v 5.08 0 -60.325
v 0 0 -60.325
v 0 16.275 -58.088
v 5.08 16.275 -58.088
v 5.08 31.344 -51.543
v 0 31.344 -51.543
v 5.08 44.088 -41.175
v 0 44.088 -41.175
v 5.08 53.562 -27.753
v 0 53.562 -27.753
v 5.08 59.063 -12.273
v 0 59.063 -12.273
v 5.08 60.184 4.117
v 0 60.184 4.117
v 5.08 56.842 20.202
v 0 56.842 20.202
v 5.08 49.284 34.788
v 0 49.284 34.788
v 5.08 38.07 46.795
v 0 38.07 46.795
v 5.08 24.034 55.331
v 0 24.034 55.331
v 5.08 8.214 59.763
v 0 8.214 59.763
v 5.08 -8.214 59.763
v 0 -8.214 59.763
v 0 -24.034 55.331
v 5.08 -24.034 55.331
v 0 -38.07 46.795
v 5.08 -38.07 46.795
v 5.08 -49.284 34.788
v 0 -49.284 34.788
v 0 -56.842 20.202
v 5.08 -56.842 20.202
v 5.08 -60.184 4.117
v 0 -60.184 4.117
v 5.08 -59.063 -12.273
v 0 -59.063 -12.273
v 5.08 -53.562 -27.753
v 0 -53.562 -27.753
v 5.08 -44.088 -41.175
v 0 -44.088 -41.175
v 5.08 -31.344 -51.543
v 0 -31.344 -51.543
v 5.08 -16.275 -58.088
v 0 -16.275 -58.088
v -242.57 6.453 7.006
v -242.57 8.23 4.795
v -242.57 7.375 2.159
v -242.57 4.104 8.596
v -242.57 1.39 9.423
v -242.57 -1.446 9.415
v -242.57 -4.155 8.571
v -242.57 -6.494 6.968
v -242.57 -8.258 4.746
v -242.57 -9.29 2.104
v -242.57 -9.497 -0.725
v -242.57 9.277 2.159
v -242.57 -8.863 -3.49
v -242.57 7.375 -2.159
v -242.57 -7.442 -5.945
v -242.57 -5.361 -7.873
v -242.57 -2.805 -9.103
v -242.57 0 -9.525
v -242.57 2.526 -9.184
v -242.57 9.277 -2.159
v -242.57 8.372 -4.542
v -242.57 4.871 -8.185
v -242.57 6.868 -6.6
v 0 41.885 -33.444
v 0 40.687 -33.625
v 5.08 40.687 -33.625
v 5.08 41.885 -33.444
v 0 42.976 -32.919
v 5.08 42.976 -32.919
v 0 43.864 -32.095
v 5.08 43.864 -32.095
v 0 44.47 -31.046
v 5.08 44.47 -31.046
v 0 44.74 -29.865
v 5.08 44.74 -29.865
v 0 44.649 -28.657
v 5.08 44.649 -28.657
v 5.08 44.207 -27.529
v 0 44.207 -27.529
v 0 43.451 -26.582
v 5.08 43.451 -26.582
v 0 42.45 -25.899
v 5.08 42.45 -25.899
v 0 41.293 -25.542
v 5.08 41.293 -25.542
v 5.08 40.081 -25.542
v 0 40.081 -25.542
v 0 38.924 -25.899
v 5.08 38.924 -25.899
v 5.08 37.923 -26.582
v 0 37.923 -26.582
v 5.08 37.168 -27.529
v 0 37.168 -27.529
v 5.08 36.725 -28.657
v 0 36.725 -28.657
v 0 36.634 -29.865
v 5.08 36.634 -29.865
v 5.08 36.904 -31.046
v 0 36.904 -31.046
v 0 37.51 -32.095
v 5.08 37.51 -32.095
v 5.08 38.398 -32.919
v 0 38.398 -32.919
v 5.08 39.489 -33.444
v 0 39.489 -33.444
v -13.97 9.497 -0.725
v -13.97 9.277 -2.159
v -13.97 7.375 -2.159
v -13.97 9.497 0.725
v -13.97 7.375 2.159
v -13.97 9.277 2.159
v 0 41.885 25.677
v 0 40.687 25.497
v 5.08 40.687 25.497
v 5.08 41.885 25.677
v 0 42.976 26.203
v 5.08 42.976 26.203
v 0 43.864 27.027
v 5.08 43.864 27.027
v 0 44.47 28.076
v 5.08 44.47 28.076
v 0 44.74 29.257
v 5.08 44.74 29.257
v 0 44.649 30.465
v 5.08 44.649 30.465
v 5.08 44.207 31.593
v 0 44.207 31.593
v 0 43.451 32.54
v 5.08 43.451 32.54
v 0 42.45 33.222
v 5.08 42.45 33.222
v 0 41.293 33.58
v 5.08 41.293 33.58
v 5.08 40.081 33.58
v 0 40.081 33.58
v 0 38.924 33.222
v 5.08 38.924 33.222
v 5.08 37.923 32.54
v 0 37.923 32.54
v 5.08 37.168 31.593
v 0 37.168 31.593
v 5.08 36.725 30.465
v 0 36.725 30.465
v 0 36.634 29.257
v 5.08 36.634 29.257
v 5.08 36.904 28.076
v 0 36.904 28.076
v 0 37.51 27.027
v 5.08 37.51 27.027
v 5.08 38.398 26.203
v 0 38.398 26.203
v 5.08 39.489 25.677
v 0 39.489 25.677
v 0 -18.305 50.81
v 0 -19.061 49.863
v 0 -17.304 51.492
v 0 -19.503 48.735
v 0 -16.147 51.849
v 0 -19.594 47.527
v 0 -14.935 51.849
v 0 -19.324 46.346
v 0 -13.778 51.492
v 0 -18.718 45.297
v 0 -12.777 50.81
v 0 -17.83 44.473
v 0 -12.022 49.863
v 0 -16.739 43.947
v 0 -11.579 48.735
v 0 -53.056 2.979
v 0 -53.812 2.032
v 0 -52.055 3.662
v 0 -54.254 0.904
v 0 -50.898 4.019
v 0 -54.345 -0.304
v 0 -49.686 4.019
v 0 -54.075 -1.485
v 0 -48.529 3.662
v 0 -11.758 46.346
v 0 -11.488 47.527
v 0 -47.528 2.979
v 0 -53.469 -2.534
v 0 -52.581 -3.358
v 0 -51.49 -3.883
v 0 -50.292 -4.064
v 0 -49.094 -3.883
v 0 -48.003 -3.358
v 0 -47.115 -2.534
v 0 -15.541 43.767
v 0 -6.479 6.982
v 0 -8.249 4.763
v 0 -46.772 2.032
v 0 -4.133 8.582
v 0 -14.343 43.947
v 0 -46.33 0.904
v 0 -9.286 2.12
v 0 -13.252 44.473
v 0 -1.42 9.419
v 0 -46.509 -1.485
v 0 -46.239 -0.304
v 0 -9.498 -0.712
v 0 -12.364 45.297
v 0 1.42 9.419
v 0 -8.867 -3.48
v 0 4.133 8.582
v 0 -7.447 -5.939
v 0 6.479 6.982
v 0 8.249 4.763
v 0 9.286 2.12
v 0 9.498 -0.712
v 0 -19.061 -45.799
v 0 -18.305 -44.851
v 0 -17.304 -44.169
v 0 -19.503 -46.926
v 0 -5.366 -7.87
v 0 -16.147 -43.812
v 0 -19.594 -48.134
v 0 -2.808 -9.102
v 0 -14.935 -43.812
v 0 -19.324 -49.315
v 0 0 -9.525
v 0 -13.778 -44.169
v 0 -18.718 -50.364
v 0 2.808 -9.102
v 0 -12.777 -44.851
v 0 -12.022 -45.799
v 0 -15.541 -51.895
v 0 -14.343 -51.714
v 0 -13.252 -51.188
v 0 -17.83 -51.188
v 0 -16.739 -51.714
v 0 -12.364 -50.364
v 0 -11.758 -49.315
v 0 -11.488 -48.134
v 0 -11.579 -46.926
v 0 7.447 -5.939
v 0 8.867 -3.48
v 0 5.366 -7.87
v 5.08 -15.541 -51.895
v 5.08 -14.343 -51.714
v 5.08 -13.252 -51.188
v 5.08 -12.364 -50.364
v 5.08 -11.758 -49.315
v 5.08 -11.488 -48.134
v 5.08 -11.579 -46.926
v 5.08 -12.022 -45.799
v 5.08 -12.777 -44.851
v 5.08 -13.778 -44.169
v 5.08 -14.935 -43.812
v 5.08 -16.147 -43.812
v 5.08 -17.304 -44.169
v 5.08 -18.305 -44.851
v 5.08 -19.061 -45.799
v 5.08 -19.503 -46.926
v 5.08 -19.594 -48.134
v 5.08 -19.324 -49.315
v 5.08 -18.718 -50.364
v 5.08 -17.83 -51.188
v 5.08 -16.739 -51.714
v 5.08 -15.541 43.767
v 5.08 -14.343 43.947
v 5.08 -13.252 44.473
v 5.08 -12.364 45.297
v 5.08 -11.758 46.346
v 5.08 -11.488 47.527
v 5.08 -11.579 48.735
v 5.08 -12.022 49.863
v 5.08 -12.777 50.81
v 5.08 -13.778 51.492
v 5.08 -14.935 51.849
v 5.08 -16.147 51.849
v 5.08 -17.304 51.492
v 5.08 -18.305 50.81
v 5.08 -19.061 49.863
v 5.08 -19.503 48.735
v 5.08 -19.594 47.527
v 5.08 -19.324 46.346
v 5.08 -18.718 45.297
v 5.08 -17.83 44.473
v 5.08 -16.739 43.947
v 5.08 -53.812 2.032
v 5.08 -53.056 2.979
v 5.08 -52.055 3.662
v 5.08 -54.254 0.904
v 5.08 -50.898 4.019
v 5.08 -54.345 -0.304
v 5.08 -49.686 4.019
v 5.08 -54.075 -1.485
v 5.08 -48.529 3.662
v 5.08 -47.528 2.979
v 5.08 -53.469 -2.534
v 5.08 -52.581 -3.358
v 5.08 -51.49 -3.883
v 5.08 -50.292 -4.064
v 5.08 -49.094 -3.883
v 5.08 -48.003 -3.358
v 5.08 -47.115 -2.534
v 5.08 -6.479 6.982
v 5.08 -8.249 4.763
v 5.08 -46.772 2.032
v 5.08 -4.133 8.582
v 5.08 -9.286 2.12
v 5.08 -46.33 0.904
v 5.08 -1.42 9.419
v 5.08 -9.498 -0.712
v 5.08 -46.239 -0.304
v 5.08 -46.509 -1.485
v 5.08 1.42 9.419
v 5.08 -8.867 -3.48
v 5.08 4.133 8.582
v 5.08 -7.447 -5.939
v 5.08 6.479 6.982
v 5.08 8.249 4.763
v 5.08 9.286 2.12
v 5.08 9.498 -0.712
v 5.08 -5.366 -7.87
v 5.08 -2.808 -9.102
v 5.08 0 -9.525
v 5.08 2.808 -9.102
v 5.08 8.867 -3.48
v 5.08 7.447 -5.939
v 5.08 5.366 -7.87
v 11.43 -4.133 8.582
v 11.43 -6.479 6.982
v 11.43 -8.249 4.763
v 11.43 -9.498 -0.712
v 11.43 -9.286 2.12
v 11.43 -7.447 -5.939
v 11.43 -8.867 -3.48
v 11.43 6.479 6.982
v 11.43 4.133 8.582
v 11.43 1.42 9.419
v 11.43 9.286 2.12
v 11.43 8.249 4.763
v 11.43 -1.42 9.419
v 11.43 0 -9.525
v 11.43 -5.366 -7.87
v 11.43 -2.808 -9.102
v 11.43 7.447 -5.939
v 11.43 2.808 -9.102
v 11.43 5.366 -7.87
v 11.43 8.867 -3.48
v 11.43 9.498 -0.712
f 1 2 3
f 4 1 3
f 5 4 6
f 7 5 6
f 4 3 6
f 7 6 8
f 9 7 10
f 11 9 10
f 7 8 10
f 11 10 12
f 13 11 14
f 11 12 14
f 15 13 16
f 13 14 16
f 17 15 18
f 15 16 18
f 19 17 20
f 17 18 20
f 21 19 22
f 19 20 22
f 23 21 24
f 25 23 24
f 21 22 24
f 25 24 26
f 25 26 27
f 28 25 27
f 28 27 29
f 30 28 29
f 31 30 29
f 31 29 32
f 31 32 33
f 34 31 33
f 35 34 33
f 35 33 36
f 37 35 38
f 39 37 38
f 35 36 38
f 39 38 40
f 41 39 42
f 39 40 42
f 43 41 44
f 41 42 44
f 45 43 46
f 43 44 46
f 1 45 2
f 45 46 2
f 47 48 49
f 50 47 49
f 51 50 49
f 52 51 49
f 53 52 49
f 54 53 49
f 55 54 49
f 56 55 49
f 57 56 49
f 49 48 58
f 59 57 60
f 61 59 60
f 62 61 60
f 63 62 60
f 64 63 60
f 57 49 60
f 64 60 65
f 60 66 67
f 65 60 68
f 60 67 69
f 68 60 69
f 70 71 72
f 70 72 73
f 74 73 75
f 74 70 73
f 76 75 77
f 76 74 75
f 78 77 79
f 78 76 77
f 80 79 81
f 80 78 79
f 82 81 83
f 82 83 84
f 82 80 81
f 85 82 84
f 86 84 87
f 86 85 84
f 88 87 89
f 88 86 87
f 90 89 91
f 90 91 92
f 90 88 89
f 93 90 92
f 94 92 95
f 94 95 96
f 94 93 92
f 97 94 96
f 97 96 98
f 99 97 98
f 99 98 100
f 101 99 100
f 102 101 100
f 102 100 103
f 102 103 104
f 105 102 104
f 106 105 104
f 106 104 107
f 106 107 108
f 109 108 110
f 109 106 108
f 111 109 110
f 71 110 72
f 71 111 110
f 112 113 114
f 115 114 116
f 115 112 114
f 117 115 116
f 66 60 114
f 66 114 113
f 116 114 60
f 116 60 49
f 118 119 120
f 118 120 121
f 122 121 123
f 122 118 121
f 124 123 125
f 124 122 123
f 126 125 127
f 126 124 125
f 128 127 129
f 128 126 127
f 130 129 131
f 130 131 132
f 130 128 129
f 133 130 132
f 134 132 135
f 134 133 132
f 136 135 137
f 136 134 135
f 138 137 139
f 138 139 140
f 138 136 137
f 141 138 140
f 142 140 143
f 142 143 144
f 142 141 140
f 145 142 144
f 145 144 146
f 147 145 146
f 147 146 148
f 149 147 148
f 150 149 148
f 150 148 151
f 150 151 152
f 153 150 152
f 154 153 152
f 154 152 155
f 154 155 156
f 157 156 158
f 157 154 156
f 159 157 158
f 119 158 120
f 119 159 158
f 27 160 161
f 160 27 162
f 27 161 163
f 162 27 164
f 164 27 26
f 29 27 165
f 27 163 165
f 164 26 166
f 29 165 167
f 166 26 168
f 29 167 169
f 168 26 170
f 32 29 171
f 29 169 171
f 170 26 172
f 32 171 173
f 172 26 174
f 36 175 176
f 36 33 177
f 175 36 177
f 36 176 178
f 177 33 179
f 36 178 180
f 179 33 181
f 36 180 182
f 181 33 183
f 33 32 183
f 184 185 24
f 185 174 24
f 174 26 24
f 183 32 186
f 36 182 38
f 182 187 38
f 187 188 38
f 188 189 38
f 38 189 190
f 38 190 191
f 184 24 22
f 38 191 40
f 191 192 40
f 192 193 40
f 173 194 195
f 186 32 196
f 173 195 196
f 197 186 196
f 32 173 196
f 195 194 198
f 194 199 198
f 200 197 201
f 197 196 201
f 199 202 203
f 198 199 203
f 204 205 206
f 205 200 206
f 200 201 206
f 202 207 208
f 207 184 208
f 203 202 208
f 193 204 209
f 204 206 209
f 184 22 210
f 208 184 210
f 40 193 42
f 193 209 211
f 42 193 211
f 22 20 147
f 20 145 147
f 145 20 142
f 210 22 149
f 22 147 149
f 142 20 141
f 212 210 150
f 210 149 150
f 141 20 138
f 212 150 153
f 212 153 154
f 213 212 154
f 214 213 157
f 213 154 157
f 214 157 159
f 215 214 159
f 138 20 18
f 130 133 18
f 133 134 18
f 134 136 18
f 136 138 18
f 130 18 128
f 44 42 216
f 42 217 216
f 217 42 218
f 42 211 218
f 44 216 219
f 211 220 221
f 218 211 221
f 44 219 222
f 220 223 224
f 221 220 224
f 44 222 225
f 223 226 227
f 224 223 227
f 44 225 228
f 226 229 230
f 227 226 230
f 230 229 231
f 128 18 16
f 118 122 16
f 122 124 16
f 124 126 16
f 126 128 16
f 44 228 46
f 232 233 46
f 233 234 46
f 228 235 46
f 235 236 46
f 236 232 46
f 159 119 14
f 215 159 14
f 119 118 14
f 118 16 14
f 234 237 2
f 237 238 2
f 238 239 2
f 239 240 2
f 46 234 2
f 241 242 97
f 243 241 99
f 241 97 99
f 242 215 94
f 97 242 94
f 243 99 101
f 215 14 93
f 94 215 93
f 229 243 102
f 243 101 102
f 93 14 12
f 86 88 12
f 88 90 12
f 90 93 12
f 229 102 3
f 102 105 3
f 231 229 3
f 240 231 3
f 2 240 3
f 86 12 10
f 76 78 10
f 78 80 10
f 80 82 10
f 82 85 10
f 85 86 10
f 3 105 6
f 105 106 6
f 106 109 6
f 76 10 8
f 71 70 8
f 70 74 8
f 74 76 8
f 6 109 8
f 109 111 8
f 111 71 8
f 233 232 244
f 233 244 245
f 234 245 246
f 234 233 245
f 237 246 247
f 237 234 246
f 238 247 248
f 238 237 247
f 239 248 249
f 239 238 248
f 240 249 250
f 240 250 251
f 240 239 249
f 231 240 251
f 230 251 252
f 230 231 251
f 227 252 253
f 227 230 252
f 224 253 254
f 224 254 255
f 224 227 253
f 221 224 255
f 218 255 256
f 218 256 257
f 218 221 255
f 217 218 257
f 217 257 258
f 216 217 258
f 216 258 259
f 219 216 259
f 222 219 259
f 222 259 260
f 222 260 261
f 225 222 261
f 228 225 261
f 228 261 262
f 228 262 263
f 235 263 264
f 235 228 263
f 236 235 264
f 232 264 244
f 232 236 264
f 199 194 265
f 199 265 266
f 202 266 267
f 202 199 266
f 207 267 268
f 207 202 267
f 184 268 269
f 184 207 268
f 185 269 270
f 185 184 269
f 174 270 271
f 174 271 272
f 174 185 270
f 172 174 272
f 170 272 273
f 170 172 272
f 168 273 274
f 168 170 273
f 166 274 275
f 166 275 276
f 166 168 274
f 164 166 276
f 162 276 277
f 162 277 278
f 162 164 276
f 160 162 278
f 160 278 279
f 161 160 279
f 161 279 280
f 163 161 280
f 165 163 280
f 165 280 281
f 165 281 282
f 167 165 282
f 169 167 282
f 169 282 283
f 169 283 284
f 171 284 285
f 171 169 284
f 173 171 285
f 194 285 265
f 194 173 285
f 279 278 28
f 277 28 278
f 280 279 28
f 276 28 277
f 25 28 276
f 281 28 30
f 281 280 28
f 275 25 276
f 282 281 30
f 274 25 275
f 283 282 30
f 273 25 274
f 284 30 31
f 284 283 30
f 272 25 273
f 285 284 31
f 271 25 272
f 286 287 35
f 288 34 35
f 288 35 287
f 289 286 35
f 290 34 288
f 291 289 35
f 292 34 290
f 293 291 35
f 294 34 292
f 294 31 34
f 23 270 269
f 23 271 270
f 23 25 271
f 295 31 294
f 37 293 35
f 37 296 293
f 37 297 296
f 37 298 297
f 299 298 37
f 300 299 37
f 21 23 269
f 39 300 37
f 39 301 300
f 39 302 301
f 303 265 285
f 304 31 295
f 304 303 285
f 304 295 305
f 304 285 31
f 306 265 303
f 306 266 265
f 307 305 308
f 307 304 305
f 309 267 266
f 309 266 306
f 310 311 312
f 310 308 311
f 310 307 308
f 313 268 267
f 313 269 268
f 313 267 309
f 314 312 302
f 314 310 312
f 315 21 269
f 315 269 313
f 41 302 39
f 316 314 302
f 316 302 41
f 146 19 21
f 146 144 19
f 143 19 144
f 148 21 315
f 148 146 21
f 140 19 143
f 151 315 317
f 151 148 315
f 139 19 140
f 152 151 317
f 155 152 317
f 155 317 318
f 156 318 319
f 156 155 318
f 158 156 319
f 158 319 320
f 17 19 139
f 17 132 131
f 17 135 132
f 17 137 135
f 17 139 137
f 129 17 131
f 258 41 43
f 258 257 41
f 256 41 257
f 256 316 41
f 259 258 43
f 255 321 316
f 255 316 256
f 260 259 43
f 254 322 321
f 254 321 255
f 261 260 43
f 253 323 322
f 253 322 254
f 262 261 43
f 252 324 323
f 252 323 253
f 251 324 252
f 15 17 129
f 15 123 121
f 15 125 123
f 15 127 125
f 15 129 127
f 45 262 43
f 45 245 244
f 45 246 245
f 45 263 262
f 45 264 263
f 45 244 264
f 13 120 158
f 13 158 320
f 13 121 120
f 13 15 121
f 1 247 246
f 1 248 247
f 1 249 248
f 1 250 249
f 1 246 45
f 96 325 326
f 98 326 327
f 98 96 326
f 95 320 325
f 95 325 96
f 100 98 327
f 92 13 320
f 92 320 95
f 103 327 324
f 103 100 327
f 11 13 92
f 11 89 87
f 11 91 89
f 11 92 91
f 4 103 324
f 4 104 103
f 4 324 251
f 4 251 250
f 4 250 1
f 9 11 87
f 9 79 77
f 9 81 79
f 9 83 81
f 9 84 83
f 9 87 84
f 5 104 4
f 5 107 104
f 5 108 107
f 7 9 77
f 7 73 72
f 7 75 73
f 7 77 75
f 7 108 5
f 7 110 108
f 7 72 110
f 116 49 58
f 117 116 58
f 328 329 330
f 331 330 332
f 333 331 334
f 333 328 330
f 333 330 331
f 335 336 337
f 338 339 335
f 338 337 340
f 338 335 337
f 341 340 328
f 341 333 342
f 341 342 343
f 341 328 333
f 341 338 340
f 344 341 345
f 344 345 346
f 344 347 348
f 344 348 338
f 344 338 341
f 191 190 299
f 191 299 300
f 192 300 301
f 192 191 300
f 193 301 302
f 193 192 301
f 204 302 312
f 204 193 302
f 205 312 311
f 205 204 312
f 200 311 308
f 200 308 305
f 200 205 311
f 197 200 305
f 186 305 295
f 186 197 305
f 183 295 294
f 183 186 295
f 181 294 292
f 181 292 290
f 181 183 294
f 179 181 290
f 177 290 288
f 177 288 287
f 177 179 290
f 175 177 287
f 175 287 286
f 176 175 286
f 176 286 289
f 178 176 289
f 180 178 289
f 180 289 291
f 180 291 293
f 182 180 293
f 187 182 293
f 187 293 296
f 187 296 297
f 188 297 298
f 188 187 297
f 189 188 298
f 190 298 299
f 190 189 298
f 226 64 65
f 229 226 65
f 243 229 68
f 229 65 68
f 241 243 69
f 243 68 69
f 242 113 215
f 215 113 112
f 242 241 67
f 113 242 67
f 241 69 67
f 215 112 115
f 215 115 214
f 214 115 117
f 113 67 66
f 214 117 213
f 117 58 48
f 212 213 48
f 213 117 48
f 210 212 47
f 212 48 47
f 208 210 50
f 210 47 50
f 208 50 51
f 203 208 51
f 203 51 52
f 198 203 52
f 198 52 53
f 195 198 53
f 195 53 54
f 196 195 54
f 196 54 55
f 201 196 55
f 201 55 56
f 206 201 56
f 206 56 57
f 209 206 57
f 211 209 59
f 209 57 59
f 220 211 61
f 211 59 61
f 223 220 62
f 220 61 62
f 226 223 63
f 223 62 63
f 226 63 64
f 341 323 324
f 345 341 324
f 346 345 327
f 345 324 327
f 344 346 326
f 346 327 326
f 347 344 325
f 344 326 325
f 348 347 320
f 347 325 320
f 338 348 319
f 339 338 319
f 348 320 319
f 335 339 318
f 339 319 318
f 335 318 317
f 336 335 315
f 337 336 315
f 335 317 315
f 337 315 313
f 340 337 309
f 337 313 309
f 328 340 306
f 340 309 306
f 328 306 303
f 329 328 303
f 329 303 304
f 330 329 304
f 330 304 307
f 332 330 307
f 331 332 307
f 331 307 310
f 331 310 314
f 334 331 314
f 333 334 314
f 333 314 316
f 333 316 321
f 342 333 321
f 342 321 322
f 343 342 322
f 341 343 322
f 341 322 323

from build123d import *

# Parameters (mm, degrees)
SKETCH1_R                = 60.325
SKETCH1_R_2              = 4.064
BOSS_EXTRUDE1_DEPTH      = 5.08
BOSS_EXTRUDE2_DEPTH      = 6.35
BOSS_EXTRUDE2_DEPTH_BACK = 247.65
SKETCH2_R                = 9.525
SKETCH4_W                = 4.318
SKETCH4_H                = 2.15
CUT_EXTRUDE1_DEPTH       = 228.6


with BuildPart() as part:
    # Sketch1 → Boss-Extrude1 (new body)
    with BuildSketch(Plane(origin=(0, 0, 0), x_dir=(0, 0, -1), z_dir=(1, 0, 0))):
        Circle(SKETCH1_R)
        with Locations((0, -50.292)):
            Circle(SKETCH1_R_2, mode=Mode.SUBTRACT)
        with Locations((-47.830534318, -15.541082681)):
            Circle(SKETCH1_R_2, mode=Mode.SUBTRACT)
        with Locations((-29.560895908, 40.687082681)):
            Circle(SKETCH1_R_2, mode=Mode.SUBTRACT)
        with Locations((29.560895908, 40.687082681)):
            Circle(SKETCH1_R_2, mode=Mode.SUBTRACT)
        with Locations((47.830534318, -15.541082681)):
            Circle(SKETCH1_R_2, mode=Mode.SUBTRACT)
    extrude(amount=BOSS_EXTRUDE1_DEPTH)

    # Sketch2 → Boss-Extrude2 (add, two sides: drawn at the far end of the back side and taken through both)
    with BuildSketch(Plane(origin=(5.08, 0, 0), x_dir=(0, 0, -1), z_dir=(1, 0, 0)).offset(-BOSS_EXTRUDE2_DEPTH_BACK)):
        Circle(SKETCH2_R)
    extrude(amount=BOSS_EXTRUDE2_DEPTH + BOSS_EXTRUDE2_DEPTH_BACK)

    # Sketch4 → Cut-Extrude1 (cut)
    with BuildSketch(Plane.ZY.offset(242.57)):
        with Locations((0, 8.45)):
            Rectangle(SKETCH4_W, SKETCH4_H)
    extrude(amount=-CUT_EXTRUDE1_DEPTH, mode=Mode.SUBTRACT)


solid = part.part
